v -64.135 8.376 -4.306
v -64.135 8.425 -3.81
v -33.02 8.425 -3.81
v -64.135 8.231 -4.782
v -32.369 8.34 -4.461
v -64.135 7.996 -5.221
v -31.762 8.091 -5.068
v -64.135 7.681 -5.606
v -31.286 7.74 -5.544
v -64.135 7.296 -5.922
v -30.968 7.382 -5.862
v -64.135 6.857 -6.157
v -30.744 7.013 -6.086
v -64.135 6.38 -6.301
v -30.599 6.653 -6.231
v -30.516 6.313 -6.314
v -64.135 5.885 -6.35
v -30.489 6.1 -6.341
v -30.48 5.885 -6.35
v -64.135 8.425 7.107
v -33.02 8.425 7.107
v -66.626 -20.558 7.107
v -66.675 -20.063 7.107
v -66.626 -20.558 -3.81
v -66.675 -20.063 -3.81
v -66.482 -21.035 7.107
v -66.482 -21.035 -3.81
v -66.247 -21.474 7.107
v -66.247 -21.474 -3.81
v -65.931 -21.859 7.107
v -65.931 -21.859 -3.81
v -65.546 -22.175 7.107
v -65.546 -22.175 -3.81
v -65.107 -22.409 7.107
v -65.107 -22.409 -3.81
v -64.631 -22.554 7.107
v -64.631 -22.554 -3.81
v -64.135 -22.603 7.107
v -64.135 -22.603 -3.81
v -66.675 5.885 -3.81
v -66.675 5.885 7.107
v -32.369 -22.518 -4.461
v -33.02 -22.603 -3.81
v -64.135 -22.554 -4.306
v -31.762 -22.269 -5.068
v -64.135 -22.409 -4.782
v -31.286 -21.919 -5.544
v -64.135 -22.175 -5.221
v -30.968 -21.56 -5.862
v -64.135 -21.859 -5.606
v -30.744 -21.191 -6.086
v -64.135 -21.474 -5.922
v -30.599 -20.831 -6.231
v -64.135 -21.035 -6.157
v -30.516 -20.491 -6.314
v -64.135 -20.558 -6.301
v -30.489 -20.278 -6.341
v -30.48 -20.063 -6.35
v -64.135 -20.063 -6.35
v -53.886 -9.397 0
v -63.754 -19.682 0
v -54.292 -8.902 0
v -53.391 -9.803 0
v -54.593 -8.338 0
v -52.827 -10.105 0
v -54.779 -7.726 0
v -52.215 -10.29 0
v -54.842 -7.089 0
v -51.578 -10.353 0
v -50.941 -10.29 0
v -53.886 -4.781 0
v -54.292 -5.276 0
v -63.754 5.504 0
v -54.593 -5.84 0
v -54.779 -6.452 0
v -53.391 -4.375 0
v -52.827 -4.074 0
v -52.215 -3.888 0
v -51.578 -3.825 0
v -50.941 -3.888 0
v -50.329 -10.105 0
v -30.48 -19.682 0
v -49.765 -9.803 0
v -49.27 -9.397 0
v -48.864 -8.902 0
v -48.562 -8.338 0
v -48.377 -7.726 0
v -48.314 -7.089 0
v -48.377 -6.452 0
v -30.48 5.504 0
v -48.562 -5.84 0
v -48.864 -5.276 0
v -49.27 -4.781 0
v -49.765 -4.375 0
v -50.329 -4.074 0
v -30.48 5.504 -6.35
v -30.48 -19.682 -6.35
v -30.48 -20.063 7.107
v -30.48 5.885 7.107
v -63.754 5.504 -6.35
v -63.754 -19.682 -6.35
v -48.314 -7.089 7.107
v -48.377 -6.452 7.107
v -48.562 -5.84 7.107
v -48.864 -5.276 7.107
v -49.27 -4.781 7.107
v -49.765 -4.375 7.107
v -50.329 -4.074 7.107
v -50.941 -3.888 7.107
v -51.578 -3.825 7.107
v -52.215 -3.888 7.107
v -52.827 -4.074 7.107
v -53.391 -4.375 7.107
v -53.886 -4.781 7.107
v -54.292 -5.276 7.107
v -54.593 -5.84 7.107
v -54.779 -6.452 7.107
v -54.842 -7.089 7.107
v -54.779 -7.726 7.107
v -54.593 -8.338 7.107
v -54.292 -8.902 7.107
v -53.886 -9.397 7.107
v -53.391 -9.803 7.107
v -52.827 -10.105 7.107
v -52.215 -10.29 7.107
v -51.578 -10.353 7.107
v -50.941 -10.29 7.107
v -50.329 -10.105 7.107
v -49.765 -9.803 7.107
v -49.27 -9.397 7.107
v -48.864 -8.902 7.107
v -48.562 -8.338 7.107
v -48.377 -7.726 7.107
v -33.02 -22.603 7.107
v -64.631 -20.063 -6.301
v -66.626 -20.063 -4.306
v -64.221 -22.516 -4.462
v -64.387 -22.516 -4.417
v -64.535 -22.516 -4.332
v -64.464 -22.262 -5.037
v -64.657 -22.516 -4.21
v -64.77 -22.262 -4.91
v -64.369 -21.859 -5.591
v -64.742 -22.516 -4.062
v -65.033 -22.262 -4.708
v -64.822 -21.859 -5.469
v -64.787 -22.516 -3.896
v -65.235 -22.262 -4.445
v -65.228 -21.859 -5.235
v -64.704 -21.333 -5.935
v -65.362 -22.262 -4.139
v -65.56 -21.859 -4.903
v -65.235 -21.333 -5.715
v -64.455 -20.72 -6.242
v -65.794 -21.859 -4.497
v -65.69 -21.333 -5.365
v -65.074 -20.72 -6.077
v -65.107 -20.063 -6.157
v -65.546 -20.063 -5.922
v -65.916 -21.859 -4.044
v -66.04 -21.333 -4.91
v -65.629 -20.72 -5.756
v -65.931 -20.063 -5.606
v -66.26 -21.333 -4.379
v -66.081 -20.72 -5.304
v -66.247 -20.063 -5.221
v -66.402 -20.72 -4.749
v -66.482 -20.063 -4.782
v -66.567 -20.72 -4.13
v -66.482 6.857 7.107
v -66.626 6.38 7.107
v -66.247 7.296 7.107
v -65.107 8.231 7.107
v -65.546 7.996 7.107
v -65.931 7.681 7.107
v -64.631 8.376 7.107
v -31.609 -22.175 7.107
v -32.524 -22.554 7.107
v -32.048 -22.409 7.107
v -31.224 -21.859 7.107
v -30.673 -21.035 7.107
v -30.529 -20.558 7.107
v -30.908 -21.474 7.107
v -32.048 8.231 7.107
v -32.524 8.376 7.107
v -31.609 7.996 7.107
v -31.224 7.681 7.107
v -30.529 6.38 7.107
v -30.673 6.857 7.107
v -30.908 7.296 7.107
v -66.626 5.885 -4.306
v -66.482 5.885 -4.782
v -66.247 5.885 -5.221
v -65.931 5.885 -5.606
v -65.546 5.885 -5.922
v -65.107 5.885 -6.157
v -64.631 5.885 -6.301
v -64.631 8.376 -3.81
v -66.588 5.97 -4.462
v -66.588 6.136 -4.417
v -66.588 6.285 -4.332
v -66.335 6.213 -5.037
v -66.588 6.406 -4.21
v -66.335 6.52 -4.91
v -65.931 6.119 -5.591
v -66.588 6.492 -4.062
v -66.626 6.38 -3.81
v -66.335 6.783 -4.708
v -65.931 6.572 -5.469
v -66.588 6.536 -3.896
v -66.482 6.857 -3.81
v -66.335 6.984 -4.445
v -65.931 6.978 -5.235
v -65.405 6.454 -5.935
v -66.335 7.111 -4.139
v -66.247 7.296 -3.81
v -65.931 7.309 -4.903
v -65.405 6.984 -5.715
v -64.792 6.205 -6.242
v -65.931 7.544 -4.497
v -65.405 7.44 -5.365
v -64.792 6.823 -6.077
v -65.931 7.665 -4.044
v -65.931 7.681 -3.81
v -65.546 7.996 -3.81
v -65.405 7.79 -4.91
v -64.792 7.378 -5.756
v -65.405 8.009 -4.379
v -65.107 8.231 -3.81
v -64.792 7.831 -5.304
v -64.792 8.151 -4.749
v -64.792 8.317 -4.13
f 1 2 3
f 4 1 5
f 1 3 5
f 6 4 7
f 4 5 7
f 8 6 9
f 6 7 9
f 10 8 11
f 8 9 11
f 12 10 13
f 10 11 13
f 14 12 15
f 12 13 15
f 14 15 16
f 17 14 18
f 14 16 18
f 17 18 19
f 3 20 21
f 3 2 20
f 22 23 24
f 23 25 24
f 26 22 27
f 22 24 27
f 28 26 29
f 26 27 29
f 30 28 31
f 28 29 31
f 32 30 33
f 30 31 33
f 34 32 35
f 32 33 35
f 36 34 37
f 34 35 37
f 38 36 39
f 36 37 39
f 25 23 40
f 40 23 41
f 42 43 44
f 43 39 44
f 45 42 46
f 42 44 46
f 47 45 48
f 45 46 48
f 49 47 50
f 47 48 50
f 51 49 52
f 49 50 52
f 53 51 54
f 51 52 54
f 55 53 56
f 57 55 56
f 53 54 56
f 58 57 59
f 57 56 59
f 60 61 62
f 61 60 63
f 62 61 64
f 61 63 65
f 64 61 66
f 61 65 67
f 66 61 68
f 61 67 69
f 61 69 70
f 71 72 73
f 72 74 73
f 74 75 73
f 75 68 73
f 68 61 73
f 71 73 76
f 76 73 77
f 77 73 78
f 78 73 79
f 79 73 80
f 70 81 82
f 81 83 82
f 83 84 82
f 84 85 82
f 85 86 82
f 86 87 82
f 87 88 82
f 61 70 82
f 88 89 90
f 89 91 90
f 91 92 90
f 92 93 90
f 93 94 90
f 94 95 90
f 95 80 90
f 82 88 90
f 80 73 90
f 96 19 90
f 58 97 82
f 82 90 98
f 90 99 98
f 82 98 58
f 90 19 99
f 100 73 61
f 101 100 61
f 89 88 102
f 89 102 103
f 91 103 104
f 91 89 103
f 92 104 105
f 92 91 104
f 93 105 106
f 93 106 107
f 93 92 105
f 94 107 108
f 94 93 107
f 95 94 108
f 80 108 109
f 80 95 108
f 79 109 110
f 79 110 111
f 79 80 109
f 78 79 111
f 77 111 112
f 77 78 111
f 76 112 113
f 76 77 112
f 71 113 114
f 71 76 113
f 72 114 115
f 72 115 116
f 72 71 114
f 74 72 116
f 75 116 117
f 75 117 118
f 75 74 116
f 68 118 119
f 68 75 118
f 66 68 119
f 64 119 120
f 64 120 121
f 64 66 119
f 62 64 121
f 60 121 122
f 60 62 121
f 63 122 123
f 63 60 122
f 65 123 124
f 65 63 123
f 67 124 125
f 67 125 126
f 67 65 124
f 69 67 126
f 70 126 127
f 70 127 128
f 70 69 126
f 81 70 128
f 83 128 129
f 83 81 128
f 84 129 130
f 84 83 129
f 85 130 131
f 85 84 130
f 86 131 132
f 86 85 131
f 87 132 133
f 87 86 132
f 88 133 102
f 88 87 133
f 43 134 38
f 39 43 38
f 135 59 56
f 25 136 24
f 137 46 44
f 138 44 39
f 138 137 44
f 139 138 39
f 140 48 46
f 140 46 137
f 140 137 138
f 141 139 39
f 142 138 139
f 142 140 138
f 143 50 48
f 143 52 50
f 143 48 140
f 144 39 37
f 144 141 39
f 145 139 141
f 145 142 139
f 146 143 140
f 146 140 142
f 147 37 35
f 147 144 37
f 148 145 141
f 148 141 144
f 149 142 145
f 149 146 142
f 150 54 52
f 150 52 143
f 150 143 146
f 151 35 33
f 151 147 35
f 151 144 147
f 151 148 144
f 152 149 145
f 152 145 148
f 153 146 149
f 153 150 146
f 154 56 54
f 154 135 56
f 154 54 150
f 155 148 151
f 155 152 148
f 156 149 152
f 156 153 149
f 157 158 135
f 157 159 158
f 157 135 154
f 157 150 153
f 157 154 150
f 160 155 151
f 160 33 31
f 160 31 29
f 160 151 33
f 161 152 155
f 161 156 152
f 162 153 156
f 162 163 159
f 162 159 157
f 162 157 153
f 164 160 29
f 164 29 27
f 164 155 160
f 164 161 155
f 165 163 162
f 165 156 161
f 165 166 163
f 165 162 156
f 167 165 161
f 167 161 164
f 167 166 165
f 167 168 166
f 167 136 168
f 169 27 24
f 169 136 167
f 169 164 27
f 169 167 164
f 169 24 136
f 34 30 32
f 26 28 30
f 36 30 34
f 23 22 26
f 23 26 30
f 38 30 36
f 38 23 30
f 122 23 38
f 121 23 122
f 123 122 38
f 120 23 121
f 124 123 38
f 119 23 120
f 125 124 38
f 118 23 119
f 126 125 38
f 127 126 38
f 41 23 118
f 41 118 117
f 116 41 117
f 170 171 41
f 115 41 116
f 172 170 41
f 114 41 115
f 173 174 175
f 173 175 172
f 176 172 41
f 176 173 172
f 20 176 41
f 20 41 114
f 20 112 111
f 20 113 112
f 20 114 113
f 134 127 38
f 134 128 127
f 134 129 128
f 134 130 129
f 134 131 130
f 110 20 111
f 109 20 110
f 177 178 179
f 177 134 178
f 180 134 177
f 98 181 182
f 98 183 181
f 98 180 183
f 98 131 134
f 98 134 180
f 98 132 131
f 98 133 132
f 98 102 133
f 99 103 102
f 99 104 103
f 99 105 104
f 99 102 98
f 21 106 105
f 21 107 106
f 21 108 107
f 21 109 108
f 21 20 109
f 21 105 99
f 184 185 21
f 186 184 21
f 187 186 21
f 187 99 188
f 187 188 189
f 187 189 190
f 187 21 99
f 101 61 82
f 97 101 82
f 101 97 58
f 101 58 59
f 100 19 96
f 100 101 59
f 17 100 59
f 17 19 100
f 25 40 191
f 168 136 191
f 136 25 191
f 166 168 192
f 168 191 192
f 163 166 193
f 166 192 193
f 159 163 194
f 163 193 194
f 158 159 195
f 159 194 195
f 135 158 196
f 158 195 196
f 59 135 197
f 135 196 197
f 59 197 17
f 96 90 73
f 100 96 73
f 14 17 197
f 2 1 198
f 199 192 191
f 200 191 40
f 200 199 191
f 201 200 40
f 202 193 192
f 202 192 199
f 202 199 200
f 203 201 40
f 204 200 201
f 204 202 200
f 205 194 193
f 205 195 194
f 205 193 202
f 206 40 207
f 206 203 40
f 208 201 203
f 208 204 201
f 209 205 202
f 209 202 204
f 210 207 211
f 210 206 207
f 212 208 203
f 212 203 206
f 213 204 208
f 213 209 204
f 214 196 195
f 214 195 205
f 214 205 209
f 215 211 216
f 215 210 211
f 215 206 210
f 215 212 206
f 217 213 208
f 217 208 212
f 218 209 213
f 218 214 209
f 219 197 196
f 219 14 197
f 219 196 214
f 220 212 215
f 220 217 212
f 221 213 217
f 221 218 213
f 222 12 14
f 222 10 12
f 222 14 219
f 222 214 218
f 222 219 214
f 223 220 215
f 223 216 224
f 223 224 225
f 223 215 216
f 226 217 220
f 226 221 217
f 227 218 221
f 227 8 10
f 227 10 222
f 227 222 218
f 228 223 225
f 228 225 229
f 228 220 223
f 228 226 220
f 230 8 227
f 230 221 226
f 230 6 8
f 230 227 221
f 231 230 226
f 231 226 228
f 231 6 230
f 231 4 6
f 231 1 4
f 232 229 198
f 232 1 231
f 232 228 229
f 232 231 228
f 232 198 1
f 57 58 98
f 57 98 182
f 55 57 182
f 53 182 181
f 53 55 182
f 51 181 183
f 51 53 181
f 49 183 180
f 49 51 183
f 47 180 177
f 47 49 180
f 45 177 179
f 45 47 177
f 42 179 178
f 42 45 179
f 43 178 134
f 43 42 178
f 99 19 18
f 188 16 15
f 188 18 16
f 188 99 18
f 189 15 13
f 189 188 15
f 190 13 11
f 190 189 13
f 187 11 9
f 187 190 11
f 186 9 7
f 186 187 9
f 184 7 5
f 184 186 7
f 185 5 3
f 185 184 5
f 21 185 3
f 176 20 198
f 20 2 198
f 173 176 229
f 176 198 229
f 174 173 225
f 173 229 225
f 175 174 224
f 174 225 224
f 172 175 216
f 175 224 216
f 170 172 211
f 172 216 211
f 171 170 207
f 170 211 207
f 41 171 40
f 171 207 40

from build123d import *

# Parameters (mm, degrees)
SKETCH1_W           = 36.195
SKETCH1_H           = 31.027347648
SKETCH1_R           = 3.2639
BOSS_EXTRUDE1_DEPTH = 7.10692
BOSS_EXTRUDE3_DEPTH = 6.35
FILLET1_R           = 2.54


with BuildPart() as part:
    # Sketch1 → Boss-Extrude1 (new body)
    with BuildSketch(Plane.XY):
        with Locations((-48.5775, -7.089116399)):
            Rectangle(SKETCH1_W, SKETCH1_H)
        with Locations((-51.577868645, -7.089116399)):
            Circle(SKETCH1_R, mode=Mode.SUBTRACT)
    extrude(amount=BOSS_EXTRUDE1_DEPTH)

    # Sketch2 → Boss-Extrude3 (add)
    with BuildSketch(Plane(origin=(0, 0, 0), x_dir=(-1, 0, 0), z_dir=(0, 0, -1))):
        Polygon((30.48, -19.681790223), (30.48, -22.602790223), (66.675, -22.602790223), (66.675, 8.424557425), (30.48, 8.424557425), (30.48, 5.503557425), (63.754, 5.503557425), (63.754, -19.681790223), align=None)
    extrude(amount=BOSS_EXTRUDE3_DEPTH)

    # Fillet1
    fillet1_edges = [part.edges().sort_by_distance(p)[0] for p in [
        (-48.5775, 8.424557425, -6.35),
        (-66.675, -7.089116399, -6.35),
        (-48.5775, -22.602790223, -6.35),
        (-66.675, 8.424557425, 0.37846),
        (-30.48, 8.424557425, 0.37846),
        (-30.48, -22.602790223, 0.37846),
        (-66.675, -22.602790223, 0.37846),
    ]]
    fillet(fillet1_edges, radius=FILLET1_R)


solid = part.part
